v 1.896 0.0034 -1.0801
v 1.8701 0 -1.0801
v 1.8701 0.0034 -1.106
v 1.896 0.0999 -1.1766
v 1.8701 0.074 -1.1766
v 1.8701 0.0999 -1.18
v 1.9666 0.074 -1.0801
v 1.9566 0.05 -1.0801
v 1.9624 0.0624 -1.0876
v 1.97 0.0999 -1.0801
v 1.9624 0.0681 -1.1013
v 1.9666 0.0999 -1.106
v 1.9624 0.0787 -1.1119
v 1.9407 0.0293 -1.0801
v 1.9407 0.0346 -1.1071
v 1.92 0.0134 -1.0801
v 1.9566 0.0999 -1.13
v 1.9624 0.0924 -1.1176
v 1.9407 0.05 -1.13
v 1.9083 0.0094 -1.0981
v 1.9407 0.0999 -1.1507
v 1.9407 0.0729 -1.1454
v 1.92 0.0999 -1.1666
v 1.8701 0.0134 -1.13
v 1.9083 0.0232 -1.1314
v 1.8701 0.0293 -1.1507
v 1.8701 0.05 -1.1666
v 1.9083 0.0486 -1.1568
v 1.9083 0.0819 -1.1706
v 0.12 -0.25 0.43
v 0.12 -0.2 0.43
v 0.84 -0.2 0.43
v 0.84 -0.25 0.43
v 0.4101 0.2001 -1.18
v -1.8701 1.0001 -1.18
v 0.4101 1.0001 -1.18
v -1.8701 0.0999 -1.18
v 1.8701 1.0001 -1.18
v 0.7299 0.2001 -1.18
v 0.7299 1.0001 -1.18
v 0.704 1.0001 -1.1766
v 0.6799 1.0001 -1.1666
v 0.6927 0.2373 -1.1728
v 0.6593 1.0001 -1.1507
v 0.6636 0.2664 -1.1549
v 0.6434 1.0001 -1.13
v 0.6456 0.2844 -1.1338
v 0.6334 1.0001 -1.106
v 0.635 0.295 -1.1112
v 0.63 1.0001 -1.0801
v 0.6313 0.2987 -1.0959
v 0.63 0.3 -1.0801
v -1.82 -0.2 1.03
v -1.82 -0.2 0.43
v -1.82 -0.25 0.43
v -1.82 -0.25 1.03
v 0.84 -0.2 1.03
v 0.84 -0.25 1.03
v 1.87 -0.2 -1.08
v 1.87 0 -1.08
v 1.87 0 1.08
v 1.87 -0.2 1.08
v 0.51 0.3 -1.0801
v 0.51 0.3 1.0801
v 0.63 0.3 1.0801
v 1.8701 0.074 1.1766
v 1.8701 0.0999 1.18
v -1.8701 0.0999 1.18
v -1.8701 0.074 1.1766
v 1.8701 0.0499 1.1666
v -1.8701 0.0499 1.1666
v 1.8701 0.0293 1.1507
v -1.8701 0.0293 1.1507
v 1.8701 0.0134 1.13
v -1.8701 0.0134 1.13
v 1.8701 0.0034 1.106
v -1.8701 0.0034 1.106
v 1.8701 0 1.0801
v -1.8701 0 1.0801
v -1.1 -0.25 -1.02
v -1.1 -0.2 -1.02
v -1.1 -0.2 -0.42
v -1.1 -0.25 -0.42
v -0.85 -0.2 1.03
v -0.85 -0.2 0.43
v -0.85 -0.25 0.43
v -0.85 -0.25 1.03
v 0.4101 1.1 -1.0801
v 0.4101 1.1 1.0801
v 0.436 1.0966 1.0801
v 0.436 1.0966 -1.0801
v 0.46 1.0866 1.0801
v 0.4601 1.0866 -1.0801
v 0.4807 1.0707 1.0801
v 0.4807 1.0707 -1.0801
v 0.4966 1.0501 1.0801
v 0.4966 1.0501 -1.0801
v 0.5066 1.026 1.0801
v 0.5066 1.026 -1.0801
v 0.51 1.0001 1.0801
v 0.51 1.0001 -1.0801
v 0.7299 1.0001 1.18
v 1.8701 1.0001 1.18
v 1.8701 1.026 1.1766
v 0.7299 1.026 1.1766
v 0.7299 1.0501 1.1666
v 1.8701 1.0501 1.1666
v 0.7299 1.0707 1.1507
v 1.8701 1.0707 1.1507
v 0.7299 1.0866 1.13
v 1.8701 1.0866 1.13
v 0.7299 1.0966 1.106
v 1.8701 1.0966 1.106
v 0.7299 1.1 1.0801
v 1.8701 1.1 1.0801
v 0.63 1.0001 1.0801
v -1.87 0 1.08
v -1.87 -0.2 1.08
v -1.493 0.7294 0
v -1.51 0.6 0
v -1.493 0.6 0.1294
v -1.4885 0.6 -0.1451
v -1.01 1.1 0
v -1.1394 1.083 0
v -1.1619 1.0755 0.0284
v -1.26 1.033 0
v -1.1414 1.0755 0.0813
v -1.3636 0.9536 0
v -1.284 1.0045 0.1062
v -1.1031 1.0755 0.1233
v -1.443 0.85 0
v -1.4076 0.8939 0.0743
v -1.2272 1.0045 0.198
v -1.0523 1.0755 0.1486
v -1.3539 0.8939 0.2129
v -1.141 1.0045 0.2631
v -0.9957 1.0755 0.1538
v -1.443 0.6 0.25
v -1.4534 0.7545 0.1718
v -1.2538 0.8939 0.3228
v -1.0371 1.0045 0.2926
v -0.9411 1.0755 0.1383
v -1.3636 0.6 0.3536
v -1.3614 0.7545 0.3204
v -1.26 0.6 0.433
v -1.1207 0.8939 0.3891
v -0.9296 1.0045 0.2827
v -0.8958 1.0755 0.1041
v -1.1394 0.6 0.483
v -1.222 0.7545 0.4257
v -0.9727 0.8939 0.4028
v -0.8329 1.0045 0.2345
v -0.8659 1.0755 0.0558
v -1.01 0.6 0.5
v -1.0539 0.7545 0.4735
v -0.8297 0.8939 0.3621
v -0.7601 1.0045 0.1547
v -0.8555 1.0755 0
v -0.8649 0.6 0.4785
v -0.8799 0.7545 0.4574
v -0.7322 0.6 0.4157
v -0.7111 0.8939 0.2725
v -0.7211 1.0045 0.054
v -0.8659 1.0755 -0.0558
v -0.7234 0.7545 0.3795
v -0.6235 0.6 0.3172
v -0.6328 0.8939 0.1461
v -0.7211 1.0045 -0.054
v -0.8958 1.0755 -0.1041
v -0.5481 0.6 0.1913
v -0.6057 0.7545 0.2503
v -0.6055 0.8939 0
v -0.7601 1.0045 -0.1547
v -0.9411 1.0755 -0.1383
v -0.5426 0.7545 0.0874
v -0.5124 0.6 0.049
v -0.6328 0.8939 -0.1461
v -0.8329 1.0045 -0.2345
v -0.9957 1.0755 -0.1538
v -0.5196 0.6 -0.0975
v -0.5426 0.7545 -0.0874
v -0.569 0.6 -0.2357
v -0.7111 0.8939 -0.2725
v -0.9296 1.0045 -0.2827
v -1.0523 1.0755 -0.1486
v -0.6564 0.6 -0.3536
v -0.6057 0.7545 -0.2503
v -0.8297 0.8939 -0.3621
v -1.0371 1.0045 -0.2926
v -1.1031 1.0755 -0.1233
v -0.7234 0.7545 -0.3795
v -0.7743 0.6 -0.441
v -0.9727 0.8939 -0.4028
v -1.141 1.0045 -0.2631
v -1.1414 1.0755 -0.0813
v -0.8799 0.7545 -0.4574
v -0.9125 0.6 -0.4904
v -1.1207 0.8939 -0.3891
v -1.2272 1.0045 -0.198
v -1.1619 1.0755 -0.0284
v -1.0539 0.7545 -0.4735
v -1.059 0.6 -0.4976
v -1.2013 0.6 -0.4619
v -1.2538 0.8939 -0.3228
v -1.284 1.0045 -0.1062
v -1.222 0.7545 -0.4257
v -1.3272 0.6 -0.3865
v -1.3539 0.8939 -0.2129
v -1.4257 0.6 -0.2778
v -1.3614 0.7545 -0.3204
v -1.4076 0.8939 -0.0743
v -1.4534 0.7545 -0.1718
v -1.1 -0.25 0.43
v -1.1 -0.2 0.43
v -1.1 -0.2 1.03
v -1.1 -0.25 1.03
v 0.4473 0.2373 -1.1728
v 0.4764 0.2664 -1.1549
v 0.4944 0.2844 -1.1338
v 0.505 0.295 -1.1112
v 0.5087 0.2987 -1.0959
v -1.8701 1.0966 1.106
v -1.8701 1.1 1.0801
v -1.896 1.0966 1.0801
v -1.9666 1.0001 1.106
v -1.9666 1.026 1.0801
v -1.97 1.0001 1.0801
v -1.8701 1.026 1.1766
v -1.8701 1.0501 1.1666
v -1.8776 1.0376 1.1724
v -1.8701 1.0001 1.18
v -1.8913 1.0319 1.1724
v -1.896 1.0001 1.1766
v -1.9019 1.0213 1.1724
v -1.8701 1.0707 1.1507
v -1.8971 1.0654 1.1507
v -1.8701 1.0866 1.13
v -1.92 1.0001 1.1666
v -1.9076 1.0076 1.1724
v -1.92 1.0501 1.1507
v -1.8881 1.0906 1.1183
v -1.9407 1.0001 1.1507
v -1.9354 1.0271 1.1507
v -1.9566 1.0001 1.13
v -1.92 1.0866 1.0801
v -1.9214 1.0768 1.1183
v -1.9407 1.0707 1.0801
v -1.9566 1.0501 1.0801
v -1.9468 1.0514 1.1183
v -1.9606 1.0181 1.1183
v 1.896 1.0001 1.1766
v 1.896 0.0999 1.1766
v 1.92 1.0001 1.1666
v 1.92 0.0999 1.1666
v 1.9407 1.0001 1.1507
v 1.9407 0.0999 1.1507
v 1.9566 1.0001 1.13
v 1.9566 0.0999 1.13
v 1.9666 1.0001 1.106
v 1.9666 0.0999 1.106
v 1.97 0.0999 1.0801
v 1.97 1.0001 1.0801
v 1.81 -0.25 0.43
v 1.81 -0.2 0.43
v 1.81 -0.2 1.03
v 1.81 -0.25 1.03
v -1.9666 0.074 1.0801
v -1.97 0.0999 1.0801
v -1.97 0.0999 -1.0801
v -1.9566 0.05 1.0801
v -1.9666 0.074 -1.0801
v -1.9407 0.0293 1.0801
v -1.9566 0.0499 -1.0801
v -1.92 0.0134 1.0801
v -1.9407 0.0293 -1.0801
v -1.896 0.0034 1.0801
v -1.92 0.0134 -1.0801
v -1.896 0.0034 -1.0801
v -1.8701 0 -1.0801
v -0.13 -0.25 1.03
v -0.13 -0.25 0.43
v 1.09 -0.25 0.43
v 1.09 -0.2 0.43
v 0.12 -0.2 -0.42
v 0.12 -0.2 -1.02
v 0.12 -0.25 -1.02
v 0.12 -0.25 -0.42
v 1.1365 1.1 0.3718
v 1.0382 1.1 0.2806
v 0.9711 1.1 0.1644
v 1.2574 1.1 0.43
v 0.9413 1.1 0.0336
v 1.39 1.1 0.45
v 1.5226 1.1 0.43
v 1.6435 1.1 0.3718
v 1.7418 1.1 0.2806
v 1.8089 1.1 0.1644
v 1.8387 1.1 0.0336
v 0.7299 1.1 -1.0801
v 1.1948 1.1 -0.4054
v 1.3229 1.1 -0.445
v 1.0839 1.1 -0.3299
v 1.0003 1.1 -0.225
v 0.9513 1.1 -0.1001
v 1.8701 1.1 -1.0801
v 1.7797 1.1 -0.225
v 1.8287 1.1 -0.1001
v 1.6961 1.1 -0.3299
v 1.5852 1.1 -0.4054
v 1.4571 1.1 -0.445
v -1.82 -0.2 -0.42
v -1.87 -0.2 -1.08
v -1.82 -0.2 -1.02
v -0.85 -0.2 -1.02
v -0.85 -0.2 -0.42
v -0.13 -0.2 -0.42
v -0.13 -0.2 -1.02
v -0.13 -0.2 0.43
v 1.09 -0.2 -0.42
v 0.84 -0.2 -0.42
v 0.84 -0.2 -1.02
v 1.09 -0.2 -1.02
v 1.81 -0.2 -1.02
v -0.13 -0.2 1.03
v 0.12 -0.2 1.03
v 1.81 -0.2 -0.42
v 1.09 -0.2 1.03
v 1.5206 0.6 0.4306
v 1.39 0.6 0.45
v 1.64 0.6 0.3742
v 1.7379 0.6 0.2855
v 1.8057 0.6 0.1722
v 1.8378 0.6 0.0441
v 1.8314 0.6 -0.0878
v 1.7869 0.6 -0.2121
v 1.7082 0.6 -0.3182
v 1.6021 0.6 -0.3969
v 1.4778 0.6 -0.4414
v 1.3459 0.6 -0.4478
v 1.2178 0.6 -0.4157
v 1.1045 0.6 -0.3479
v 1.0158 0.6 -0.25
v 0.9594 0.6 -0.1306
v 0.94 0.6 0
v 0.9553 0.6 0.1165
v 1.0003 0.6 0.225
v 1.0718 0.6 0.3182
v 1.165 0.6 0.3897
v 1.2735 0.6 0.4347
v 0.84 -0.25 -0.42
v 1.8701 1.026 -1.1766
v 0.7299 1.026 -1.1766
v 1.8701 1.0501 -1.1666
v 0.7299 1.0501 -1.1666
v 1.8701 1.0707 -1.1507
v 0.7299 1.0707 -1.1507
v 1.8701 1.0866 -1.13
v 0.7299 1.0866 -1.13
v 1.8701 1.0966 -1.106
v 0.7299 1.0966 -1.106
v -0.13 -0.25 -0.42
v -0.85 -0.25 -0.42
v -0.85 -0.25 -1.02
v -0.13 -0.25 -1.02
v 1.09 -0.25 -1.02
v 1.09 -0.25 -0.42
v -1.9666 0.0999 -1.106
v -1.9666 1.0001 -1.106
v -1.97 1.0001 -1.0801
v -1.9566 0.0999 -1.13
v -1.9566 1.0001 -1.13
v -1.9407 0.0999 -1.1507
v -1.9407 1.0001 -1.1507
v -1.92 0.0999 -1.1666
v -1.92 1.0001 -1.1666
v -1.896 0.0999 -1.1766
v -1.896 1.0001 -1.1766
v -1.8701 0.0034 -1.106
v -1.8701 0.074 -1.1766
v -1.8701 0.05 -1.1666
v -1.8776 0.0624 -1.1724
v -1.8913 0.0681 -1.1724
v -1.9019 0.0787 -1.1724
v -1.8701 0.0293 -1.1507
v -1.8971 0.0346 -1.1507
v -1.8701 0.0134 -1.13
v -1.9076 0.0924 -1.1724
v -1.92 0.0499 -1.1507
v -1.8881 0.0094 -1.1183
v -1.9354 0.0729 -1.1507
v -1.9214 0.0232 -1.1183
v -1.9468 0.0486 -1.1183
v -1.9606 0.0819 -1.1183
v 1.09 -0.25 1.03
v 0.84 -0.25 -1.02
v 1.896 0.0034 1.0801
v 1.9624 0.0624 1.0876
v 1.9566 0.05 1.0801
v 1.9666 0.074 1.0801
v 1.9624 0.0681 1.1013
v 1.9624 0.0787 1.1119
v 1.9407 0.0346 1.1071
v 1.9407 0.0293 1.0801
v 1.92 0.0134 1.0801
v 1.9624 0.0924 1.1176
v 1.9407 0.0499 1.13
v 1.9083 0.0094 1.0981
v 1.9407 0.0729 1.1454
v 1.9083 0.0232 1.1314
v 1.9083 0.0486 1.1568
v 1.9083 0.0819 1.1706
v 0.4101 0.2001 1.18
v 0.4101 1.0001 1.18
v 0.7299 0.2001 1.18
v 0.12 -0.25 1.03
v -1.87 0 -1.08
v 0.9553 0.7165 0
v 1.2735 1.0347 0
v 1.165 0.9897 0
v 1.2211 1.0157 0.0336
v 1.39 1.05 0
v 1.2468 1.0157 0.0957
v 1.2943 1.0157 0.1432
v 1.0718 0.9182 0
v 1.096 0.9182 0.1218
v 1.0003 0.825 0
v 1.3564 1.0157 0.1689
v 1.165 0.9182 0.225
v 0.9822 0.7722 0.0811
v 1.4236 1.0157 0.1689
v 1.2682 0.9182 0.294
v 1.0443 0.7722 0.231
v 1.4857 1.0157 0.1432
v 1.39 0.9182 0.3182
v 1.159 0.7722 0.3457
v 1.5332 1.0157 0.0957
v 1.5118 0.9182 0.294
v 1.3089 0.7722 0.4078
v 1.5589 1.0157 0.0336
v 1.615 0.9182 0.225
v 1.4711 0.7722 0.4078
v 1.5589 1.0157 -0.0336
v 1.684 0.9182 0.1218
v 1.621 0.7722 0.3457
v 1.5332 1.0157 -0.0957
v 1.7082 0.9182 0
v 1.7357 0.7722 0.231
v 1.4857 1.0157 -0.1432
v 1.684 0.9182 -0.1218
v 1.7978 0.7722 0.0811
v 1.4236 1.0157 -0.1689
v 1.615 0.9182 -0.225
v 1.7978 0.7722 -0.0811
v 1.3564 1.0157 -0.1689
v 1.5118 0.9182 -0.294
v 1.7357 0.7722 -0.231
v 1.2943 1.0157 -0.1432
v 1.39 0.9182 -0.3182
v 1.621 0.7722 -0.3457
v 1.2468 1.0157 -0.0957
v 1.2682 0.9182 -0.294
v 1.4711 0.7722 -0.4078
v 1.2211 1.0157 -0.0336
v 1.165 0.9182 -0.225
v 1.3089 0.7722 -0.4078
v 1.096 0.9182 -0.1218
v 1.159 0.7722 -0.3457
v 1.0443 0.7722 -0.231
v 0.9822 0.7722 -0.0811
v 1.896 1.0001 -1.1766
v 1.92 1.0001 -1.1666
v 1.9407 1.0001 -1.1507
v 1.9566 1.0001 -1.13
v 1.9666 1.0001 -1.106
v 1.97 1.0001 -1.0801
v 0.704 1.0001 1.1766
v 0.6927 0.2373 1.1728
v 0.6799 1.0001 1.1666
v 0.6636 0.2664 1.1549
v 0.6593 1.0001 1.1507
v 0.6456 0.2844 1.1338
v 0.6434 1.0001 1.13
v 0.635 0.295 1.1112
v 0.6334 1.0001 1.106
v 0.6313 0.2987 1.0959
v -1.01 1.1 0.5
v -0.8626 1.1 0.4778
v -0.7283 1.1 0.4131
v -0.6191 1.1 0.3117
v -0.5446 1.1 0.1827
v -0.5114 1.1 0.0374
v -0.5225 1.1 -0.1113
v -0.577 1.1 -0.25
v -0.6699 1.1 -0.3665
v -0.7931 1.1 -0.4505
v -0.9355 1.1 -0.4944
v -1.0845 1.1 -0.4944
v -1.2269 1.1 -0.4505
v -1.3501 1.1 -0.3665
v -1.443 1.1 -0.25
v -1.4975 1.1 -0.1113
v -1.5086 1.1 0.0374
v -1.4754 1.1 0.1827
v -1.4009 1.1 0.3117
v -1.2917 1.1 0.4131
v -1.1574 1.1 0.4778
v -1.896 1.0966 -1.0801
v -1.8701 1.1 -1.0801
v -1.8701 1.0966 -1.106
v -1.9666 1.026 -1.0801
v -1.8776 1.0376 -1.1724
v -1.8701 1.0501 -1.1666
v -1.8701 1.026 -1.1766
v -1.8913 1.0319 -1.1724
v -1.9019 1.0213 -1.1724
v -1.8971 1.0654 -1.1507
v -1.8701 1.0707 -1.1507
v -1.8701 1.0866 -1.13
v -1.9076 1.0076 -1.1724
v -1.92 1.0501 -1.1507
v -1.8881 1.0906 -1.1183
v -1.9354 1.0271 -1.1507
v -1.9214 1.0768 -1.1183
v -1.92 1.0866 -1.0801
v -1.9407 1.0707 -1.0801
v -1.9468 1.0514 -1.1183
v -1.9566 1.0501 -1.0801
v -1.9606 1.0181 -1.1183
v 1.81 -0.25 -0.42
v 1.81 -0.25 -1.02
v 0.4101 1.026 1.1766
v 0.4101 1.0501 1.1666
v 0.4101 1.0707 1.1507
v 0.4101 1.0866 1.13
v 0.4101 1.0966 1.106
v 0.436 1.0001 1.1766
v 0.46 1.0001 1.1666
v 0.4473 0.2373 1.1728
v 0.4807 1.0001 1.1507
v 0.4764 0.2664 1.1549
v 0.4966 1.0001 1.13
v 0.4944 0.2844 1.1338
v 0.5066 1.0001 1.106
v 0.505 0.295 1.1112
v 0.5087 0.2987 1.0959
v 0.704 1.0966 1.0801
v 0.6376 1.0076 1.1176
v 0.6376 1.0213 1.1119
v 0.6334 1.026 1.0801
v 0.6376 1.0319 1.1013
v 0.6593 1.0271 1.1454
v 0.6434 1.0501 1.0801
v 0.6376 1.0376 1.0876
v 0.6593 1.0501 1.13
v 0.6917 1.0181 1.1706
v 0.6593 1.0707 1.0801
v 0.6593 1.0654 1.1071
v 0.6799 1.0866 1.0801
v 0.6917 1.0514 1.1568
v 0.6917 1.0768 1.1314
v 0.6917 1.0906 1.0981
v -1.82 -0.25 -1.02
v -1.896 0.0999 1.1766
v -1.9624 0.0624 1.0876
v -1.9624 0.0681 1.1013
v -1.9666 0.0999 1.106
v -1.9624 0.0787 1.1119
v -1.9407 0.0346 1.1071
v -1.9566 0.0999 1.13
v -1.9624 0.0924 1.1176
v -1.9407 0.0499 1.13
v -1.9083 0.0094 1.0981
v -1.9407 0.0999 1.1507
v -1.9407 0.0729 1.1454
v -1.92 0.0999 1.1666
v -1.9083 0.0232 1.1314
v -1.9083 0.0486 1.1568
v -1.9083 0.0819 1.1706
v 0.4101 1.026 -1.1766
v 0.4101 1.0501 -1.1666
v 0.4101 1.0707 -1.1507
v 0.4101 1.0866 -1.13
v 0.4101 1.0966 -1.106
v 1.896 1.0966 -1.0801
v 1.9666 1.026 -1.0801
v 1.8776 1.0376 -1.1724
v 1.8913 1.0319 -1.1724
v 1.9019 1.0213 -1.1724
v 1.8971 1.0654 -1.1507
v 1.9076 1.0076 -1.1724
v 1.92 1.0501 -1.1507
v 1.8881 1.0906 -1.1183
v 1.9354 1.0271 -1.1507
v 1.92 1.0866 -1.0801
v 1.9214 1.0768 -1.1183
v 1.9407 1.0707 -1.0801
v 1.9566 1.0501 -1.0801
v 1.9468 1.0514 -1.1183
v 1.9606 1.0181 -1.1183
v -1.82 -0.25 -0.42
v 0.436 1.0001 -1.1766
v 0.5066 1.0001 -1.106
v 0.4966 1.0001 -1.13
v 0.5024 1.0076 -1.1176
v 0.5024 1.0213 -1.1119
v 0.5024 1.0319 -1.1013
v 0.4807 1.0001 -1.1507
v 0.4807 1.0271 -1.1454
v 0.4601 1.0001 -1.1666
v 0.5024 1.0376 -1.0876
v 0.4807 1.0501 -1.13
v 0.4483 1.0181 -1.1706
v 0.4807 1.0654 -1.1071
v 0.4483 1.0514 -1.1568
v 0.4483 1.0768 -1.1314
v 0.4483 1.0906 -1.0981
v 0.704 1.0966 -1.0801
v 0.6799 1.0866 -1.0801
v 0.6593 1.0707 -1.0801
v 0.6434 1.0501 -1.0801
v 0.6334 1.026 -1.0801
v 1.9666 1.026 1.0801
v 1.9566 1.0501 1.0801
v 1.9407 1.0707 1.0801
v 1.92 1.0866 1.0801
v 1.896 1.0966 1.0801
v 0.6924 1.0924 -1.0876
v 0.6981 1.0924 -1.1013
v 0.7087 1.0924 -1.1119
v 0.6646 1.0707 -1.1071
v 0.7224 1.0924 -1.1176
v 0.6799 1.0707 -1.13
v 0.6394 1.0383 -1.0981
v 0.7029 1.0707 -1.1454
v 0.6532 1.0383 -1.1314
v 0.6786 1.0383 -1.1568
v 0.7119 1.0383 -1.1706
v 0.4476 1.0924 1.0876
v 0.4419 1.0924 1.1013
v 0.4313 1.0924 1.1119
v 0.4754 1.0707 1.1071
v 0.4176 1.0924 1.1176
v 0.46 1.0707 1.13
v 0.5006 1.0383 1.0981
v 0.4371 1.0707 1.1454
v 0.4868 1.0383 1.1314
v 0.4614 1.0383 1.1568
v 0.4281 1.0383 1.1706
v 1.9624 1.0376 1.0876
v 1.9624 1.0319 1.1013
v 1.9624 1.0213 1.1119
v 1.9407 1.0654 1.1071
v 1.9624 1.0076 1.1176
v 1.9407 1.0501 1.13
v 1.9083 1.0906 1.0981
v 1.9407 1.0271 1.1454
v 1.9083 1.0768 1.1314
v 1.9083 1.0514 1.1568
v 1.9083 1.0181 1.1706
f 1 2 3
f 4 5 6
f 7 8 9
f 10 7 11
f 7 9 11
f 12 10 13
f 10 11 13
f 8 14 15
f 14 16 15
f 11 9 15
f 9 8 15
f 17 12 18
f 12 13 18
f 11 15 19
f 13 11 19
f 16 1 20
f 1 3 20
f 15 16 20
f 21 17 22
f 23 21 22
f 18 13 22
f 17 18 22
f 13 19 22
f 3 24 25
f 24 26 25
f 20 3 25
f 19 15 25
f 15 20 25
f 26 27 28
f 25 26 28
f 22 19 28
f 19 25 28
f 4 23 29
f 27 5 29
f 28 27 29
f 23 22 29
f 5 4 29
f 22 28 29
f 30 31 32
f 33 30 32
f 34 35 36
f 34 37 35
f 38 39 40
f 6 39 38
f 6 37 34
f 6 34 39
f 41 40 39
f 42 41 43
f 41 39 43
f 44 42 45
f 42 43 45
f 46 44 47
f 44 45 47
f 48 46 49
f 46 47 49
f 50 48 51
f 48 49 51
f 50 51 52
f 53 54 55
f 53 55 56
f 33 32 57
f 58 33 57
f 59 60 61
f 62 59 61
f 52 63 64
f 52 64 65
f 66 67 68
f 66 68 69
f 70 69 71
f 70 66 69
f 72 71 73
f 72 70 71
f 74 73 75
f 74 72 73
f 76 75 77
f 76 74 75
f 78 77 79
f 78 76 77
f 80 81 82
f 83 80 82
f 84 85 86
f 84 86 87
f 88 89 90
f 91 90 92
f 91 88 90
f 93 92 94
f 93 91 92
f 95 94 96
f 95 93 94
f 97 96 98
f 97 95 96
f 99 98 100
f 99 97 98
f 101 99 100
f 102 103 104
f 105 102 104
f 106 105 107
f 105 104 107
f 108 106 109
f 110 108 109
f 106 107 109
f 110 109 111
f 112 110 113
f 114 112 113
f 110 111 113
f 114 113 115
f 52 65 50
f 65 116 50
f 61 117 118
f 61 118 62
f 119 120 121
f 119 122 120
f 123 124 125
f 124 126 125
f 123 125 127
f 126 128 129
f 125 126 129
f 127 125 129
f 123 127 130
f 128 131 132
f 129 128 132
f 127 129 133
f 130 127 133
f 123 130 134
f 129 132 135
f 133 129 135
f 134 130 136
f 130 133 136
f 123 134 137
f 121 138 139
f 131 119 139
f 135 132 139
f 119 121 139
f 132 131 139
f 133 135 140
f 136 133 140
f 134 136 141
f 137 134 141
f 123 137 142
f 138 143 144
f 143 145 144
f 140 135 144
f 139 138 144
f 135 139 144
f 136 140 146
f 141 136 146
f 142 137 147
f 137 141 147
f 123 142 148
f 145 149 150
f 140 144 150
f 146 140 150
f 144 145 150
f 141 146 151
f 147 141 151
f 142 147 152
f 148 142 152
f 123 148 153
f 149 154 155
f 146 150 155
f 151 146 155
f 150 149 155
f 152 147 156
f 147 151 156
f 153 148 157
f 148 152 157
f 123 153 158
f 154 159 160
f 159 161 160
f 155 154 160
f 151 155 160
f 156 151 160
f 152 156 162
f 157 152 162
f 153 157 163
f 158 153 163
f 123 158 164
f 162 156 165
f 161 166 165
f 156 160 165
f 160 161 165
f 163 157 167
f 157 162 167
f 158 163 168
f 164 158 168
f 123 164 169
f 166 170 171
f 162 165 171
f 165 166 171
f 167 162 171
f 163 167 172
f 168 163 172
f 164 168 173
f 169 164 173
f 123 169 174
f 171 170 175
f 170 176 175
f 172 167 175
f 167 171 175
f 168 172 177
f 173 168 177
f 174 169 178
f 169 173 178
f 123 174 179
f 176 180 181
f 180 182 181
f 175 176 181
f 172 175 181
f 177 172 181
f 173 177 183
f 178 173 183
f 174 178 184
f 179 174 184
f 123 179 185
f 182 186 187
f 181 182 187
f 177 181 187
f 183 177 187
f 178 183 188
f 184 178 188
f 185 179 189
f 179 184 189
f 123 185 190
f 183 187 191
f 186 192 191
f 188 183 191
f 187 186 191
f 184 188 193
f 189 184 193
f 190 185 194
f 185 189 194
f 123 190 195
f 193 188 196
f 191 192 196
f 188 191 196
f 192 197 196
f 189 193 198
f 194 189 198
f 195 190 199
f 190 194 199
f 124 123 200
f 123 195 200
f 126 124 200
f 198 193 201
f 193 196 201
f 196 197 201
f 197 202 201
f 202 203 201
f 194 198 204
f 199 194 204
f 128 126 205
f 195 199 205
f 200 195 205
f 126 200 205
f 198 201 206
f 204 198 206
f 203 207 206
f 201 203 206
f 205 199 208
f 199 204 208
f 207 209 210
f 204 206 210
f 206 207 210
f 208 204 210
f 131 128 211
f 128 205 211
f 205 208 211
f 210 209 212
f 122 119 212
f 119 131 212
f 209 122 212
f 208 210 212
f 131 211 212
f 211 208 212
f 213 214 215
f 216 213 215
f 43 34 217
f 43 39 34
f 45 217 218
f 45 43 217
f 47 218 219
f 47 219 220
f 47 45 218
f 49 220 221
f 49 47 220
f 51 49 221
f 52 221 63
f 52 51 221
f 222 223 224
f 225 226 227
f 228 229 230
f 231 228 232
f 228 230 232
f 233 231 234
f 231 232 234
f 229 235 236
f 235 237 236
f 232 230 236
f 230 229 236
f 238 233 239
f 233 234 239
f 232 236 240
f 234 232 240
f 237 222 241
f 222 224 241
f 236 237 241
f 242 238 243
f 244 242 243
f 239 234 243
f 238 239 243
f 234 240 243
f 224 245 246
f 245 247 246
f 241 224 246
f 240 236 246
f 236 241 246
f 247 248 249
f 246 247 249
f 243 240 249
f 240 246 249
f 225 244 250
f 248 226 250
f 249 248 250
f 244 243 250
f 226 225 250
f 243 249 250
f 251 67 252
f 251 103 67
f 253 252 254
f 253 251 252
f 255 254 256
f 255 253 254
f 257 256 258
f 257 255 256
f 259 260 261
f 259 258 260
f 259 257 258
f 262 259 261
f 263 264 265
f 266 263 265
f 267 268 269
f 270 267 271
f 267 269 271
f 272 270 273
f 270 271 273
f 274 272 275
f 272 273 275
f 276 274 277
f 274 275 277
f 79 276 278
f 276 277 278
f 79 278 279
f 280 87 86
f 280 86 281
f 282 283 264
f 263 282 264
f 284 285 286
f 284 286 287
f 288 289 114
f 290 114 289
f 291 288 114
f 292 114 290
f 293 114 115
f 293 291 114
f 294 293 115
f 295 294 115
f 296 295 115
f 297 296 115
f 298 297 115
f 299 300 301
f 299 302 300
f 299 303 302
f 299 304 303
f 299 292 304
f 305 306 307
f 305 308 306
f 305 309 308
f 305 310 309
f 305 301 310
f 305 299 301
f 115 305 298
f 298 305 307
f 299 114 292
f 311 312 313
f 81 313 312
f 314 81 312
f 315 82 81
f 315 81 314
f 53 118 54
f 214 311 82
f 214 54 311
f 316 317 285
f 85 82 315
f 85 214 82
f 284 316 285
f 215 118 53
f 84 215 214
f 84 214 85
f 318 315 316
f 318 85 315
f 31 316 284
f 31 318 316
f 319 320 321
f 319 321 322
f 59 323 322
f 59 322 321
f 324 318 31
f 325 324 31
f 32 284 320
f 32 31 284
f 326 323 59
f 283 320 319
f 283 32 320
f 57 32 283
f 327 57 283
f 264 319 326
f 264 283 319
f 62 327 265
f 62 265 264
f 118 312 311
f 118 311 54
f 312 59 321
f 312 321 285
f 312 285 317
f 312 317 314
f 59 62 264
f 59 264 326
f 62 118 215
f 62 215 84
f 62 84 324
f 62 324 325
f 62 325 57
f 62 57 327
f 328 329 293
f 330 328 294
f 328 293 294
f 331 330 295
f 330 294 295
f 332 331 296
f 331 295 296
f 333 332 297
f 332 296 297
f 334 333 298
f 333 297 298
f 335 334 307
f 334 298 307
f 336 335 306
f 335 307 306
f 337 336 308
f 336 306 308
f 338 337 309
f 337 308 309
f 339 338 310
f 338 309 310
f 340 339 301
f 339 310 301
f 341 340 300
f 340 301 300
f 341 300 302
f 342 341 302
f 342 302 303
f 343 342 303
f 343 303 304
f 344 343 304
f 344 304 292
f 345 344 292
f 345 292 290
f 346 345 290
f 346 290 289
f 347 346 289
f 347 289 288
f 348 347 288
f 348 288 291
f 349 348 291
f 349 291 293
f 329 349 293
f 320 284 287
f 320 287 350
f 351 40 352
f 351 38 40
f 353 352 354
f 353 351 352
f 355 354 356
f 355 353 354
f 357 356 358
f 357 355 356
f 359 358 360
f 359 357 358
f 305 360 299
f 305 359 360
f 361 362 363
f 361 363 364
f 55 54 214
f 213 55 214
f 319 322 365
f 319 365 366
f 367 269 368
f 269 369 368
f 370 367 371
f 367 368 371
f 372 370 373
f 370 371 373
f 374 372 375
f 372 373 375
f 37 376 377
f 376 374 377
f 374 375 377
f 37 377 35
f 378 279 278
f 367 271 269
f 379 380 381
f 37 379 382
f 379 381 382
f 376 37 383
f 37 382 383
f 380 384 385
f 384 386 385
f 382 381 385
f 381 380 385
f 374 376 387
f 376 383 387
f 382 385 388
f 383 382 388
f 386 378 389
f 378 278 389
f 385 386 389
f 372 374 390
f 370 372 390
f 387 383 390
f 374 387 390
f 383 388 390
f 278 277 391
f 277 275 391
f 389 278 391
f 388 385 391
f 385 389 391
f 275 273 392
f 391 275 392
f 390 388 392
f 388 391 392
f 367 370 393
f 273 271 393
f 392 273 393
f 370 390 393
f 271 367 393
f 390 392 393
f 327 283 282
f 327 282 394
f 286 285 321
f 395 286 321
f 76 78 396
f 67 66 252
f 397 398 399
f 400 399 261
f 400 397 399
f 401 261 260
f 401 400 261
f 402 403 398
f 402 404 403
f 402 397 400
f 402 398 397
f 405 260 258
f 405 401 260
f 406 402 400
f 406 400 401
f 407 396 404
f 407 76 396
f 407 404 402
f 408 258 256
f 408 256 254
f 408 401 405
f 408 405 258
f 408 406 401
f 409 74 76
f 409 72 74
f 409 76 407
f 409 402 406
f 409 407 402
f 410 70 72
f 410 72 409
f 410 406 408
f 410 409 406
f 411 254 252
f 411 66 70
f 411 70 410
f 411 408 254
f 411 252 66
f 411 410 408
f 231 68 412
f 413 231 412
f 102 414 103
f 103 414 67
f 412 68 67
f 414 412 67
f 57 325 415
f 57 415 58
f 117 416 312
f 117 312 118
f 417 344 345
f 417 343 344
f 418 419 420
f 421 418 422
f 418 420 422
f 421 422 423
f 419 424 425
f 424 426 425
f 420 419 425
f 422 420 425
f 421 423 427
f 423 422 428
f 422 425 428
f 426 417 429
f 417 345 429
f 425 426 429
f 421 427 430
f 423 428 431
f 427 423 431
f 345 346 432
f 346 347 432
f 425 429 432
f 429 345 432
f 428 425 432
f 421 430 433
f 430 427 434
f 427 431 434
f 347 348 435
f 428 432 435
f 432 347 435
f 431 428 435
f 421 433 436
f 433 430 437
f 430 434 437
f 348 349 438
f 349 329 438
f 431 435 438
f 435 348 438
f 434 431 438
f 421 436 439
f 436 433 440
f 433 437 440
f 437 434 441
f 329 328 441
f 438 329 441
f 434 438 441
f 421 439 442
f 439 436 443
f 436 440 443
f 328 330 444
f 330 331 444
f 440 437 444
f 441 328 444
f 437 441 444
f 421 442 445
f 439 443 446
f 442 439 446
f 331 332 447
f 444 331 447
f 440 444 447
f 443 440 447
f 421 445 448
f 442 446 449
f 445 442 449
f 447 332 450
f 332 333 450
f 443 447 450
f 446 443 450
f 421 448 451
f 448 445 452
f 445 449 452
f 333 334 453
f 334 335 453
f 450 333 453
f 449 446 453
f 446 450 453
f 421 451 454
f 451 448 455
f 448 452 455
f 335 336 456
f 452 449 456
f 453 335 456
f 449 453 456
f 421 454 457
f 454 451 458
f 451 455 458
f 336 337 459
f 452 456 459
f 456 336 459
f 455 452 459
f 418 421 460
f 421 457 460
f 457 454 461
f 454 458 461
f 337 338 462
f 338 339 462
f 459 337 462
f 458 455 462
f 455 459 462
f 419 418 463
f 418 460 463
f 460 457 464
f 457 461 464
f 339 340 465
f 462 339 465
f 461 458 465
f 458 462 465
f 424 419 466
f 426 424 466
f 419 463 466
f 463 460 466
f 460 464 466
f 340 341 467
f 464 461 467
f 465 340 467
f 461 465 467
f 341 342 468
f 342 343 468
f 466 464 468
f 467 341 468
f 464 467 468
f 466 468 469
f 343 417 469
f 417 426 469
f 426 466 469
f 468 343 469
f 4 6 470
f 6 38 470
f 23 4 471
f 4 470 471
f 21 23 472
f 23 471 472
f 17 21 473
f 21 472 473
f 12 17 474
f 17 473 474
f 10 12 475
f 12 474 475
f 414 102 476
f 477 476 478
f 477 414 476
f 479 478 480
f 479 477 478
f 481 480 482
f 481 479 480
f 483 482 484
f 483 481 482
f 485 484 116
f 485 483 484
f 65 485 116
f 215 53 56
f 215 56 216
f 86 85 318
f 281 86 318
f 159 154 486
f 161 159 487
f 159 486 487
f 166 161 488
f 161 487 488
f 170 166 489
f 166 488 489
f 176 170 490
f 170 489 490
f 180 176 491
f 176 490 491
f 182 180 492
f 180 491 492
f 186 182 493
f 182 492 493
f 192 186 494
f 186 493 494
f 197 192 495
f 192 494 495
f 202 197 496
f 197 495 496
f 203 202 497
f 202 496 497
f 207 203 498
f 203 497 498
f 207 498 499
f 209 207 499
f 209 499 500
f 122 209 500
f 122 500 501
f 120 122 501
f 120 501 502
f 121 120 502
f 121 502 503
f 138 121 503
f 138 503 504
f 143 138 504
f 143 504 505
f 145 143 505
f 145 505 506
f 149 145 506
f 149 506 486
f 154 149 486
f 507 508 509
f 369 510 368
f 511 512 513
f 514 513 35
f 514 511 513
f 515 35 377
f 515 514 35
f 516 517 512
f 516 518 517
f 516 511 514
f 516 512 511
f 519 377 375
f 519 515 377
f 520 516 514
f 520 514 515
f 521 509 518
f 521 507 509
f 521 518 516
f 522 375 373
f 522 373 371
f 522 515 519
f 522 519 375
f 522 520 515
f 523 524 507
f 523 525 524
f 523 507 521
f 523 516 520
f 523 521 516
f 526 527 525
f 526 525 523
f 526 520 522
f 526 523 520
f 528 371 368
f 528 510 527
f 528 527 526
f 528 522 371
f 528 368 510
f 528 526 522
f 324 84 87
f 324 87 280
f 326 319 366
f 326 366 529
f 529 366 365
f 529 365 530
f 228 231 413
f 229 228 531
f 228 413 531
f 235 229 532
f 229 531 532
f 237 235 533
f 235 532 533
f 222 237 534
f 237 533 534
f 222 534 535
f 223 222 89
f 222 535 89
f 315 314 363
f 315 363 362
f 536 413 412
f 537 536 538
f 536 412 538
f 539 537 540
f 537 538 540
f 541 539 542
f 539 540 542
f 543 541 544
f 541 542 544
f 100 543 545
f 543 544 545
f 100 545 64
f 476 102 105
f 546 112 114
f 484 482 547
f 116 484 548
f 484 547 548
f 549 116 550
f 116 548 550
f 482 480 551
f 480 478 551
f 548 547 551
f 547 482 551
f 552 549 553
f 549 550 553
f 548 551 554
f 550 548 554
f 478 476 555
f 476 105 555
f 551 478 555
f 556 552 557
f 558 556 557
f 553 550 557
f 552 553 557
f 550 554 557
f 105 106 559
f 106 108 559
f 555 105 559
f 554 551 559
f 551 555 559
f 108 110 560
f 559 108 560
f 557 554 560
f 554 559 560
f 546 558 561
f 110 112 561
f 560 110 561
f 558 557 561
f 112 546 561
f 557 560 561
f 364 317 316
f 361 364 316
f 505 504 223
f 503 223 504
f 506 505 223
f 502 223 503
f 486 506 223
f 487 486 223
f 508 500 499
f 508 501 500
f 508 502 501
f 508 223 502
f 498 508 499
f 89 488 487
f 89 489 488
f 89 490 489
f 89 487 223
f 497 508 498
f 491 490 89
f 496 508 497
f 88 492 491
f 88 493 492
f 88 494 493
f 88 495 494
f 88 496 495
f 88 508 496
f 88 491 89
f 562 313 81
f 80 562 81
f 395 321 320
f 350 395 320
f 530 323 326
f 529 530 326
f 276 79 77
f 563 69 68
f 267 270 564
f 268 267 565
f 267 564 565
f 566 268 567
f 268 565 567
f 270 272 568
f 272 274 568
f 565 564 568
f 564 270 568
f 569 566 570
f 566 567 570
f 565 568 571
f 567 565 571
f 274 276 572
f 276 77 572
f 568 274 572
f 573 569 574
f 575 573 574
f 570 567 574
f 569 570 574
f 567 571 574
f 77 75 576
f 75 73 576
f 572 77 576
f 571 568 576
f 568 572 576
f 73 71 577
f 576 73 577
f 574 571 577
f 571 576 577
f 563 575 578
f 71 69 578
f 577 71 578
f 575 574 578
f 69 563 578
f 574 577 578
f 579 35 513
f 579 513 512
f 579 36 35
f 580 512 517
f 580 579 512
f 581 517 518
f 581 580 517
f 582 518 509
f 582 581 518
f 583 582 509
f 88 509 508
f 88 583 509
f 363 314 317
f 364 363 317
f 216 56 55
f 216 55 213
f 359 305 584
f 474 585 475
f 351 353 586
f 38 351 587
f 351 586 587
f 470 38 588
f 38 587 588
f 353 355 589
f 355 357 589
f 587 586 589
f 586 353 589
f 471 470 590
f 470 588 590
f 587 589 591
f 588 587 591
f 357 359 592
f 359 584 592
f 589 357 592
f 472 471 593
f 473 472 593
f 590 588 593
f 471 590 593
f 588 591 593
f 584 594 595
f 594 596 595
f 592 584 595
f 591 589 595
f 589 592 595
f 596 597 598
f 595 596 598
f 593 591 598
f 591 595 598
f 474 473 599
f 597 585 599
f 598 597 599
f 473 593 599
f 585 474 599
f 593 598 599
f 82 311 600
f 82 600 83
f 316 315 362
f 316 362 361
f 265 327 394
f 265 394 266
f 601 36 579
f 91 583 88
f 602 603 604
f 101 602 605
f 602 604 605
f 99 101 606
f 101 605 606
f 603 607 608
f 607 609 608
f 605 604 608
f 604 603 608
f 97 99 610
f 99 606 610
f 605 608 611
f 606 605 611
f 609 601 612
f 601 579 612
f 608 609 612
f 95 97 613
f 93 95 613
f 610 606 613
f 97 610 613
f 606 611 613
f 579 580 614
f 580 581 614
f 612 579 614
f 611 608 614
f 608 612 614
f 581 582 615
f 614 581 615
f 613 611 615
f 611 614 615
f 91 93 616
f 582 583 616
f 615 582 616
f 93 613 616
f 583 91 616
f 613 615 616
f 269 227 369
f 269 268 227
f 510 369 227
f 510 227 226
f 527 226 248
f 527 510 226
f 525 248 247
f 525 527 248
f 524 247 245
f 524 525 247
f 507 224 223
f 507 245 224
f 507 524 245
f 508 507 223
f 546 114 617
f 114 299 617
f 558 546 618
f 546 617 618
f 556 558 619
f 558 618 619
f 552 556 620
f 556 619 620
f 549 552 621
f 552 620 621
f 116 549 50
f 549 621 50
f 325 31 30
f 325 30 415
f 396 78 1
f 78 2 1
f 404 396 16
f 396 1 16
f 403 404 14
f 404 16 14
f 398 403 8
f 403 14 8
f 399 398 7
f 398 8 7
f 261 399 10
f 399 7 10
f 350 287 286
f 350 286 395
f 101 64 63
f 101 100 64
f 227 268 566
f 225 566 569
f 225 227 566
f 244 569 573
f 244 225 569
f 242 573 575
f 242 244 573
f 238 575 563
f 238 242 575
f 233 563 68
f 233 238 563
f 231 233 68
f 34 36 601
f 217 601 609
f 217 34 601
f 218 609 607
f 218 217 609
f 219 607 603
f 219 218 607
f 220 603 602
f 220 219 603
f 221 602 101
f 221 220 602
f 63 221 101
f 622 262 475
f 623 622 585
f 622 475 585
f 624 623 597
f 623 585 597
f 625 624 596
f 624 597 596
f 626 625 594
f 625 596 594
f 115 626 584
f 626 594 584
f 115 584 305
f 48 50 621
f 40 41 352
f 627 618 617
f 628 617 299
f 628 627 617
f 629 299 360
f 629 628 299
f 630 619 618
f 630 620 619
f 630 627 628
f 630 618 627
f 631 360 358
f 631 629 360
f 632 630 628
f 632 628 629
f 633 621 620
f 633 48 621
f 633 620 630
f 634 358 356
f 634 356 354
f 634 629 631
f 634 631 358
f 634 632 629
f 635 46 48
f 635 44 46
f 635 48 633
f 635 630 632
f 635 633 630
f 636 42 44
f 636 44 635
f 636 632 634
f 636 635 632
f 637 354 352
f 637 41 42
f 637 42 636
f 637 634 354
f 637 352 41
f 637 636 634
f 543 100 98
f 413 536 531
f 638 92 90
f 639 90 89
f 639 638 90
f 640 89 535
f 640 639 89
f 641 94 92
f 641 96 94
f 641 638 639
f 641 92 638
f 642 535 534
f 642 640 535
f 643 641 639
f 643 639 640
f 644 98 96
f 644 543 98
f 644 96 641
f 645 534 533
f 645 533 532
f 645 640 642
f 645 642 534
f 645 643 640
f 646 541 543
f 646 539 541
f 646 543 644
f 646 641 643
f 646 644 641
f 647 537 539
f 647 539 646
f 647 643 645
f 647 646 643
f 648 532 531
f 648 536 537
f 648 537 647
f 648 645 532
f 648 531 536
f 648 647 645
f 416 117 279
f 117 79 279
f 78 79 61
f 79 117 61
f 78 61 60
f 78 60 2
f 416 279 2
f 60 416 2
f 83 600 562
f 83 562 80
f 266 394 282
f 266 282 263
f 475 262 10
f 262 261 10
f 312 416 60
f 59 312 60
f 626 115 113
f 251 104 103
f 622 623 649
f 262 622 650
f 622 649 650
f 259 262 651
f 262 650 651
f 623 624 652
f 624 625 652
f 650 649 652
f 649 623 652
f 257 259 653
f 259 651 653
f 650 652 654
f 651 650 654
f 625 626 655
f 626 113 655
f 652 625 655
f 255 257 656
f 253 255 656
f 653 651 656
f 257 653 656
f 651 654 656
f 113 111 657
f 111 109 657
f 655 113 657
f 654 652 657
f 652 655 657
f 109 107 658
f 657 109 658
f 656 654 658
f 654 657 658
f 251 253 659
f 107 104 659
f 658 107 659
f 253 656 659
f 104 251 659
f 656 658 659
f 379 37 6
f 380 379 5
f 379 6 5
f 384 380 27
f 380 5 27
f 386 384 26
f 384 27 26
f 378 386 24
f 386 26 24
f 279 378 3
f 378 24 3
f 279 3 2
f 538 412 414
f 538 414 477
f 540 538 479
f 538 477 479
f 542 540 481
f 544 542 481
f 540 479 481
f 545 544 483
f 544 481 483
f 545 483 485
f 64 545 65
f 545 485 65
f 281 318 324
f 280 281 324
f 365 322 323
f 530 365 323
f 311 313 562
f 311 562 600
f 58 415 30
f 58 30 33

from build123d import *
from build123d.topology import SkipClean

# Parameters (mm, degrees)
SKETCH_1_W          = 3.94
SKETCH_1_H          = 2.36
BOSS_EXTRUDE1_DEPTH = 1.1
SKETCH_2_W          = 3.74
SKETCH_2_H          = 2.16
BOSS_EXTRUDE2_DEPTH = 0.2
SKETCH_3_W          = 0.72
SKETCH_3_H          = 0.6
BOSS_EXTRUDE3_DEPTH = 0.05
SKETCH_4_W          = 0.12
SKETCH_4_H          = 2.36
CUT_EXTRUDE1_DEPTH  = 0.8
FILLET1_R           = 0.1
SKETCH_5_R          = 0.5
SKETCH_5_R_2        = 0.45
CUT_EXTRUDE2_DEPTH  = 0.5


with BuildPart() as part:
    # 草图1 → Boss-Extrude1 (new body)
    with BuildSketch(Plane(origin=(0, 0, 0), x_dir=(1, 0, 0), z_dir=(0, 1, 0))):
        Rectangle(SKETCH_1_W, SKETCH_1_H)
    extrude(amount=BOSS_EXTRUDE1_DEPTH)

    # 草图2 → Boss-Extrude2 (add)
    with BuildSketch(Plane.XZ):
        Rectangle(SKETCH_2_W, SKETCH_2_H)
    extrude(amount=BOSS_EXTRUDE2_DEPTH)

    # 草图3 → Boss-Extrude3 (add)
    with BuildSketch(Plane.XZ.offset(0.2)):
        with Locations((-1.46, 0.73)):
            Rectangle(SKETCH_3_W, SKETCH_3_H)
        with Locations((-0.49, 0.73)):
            Rectangle(SKETCH_3_W, SKETCH_3_H)
        with Locations((0.48, 0.73)):
            Rectangle(SKETCH_3_W, SKETCH_3_H)
        with Locations((1.45, 0.73)):
            Rectangle(SKETCH_3_W, SKETCH_3_H)
        with Locations((-0.49, -0.72)):
            Rectangle(SKETCH_3_W, SKETCH_3_H)
        with Locations((0.48, -0.72)):
            Rectangle(SKETCH_3_W, SKETCH_3_H)
        with Locations((1.45, -0.72)):
            Rectangle(SKETCH_3_W, SKETCH_3_H)
        with Locations((-1.46, -0.72)):
            Rectangle(SKETCH_3_W, SKETCH_3_H)
    extrude(amount=BOSS_EXTRUDE3_DEPTH)

    # 草图4 → Cut-Extrude1 (cut)
    with BuildSketch(Plane(origin=(0, 1.1, 0), x_dir=(1, 0, 0), z_dir=(0, 1, 0))):
        with Locations((0.57, 0)):
            Rectangle(SKETCH_4_W, SKETCH_4_H)
    extrude(amount=-CUT_EXTRUDE1_DEPTH, mode=Mode.SUBTRACT)

    # Fillet1
    fillet1_edges = [part.edges().sort_by_distance(p)[0] for p in [
        (-1.97, 1.1, 0),
        (-0.73, 1.1, -1.18),
        (1.3, 1.1, 1.18),
        (0.63, 0.7, -1.18),
        (0.57, 0.3, 1.18),
        (0.63, 0.7, 1.18),
        (0.51, 0.7, 1.18),
        (0.57, 0.3, -1.18),
        (0.51, 0.7, -1.18),
        (0.63, 1.1, 0),
        (0.51, 1.1, 0),
        (-0.73, 1.1, 1.18),
        (1.97, 1.1, 0),
        (0, 0, 1.18),
        (-1.97, 0, 0),
        (0, 0, -1.18),
        (1.97, 0, 0),
        (1.3, 1.1, -1.18),
        (1.97, 0.55, 1.18),
        (-1.97, 0.55, 1.18),
        (-1.97, 0.55, -1.18),
        (1.97, 0.55, -1.18),
    ]]
    fillet(fillet1_edges, radius=FILLET1_R - 0.0001)  # a hair under: the kernel refuses the full size

    # 草图5 → Cut-Extrude2 (cut)
    with BuildSketch(Plane(origin=(0, 1.1, 0), x_dir=(1, 0, 0), z_dir=(0, 1, 0))):
        with Locations(Location((-1.01, 0, 0), (0, 0, 270))):
            Circle(SKETCH_5_R)
        with Locations(Location((1.39, 0, 0), (0, 0, 270))):
            Circle(SKETCH_5_R_2)
    extrude(amount=-CUT_EXTRUDE2_DEPTH, mode=Mode.SUBTRACT)

    # 草图6 → Boss-Revole1 (revolve)
    with SkipClean():  # the faces are left unmerged after this step: merging them gives an invalid solid
        with BuildSketch(Plane.XY):
            with BuildLine():
                ThreePointArc((-1.01, 1.1), (-1.363553391, 0.953553391), (-1.51, 0.6))
                Line((-1.51, 0.6), (-1.01, 0.6))
                Line((-1.01, 0.6), (-1.01, 1.1))
            make_face()
            with BuildLine():
                Line((-1.01, 1.1), (-1.01, 0.6))
                Line((-1.01, 0.6), (-0.51, 0.6))
                ThreePointArc((-0.51, 0.6), (-0.656446609, 0.953553391), (-1.01, 1.1))
            make_face()
        revolve(axis=Axis((-1.01, 0.436033652, 0), (0, 1, 0)))
    add(part.part.scale(1), mode=Mode.REPLACE)  # the faces are merged on a copy

    # 草图7 → Boss-Revole2 (revolve)
    with BuildSketch(Plane.XY):
        with BuildLine():
            Line((0.94, 0.6), (1.39, 0.6))
            Line((1.39, 0.6), (1.39, 1.05))
            ThreePointArc((1.39, 1.05), (1.071801948, 0.918198052), (0.94, 0.6))
        make_face()
    revolve(axis=Axis((1.39, 0.6, 0), (0, 1, 0)))


solid = part.part
